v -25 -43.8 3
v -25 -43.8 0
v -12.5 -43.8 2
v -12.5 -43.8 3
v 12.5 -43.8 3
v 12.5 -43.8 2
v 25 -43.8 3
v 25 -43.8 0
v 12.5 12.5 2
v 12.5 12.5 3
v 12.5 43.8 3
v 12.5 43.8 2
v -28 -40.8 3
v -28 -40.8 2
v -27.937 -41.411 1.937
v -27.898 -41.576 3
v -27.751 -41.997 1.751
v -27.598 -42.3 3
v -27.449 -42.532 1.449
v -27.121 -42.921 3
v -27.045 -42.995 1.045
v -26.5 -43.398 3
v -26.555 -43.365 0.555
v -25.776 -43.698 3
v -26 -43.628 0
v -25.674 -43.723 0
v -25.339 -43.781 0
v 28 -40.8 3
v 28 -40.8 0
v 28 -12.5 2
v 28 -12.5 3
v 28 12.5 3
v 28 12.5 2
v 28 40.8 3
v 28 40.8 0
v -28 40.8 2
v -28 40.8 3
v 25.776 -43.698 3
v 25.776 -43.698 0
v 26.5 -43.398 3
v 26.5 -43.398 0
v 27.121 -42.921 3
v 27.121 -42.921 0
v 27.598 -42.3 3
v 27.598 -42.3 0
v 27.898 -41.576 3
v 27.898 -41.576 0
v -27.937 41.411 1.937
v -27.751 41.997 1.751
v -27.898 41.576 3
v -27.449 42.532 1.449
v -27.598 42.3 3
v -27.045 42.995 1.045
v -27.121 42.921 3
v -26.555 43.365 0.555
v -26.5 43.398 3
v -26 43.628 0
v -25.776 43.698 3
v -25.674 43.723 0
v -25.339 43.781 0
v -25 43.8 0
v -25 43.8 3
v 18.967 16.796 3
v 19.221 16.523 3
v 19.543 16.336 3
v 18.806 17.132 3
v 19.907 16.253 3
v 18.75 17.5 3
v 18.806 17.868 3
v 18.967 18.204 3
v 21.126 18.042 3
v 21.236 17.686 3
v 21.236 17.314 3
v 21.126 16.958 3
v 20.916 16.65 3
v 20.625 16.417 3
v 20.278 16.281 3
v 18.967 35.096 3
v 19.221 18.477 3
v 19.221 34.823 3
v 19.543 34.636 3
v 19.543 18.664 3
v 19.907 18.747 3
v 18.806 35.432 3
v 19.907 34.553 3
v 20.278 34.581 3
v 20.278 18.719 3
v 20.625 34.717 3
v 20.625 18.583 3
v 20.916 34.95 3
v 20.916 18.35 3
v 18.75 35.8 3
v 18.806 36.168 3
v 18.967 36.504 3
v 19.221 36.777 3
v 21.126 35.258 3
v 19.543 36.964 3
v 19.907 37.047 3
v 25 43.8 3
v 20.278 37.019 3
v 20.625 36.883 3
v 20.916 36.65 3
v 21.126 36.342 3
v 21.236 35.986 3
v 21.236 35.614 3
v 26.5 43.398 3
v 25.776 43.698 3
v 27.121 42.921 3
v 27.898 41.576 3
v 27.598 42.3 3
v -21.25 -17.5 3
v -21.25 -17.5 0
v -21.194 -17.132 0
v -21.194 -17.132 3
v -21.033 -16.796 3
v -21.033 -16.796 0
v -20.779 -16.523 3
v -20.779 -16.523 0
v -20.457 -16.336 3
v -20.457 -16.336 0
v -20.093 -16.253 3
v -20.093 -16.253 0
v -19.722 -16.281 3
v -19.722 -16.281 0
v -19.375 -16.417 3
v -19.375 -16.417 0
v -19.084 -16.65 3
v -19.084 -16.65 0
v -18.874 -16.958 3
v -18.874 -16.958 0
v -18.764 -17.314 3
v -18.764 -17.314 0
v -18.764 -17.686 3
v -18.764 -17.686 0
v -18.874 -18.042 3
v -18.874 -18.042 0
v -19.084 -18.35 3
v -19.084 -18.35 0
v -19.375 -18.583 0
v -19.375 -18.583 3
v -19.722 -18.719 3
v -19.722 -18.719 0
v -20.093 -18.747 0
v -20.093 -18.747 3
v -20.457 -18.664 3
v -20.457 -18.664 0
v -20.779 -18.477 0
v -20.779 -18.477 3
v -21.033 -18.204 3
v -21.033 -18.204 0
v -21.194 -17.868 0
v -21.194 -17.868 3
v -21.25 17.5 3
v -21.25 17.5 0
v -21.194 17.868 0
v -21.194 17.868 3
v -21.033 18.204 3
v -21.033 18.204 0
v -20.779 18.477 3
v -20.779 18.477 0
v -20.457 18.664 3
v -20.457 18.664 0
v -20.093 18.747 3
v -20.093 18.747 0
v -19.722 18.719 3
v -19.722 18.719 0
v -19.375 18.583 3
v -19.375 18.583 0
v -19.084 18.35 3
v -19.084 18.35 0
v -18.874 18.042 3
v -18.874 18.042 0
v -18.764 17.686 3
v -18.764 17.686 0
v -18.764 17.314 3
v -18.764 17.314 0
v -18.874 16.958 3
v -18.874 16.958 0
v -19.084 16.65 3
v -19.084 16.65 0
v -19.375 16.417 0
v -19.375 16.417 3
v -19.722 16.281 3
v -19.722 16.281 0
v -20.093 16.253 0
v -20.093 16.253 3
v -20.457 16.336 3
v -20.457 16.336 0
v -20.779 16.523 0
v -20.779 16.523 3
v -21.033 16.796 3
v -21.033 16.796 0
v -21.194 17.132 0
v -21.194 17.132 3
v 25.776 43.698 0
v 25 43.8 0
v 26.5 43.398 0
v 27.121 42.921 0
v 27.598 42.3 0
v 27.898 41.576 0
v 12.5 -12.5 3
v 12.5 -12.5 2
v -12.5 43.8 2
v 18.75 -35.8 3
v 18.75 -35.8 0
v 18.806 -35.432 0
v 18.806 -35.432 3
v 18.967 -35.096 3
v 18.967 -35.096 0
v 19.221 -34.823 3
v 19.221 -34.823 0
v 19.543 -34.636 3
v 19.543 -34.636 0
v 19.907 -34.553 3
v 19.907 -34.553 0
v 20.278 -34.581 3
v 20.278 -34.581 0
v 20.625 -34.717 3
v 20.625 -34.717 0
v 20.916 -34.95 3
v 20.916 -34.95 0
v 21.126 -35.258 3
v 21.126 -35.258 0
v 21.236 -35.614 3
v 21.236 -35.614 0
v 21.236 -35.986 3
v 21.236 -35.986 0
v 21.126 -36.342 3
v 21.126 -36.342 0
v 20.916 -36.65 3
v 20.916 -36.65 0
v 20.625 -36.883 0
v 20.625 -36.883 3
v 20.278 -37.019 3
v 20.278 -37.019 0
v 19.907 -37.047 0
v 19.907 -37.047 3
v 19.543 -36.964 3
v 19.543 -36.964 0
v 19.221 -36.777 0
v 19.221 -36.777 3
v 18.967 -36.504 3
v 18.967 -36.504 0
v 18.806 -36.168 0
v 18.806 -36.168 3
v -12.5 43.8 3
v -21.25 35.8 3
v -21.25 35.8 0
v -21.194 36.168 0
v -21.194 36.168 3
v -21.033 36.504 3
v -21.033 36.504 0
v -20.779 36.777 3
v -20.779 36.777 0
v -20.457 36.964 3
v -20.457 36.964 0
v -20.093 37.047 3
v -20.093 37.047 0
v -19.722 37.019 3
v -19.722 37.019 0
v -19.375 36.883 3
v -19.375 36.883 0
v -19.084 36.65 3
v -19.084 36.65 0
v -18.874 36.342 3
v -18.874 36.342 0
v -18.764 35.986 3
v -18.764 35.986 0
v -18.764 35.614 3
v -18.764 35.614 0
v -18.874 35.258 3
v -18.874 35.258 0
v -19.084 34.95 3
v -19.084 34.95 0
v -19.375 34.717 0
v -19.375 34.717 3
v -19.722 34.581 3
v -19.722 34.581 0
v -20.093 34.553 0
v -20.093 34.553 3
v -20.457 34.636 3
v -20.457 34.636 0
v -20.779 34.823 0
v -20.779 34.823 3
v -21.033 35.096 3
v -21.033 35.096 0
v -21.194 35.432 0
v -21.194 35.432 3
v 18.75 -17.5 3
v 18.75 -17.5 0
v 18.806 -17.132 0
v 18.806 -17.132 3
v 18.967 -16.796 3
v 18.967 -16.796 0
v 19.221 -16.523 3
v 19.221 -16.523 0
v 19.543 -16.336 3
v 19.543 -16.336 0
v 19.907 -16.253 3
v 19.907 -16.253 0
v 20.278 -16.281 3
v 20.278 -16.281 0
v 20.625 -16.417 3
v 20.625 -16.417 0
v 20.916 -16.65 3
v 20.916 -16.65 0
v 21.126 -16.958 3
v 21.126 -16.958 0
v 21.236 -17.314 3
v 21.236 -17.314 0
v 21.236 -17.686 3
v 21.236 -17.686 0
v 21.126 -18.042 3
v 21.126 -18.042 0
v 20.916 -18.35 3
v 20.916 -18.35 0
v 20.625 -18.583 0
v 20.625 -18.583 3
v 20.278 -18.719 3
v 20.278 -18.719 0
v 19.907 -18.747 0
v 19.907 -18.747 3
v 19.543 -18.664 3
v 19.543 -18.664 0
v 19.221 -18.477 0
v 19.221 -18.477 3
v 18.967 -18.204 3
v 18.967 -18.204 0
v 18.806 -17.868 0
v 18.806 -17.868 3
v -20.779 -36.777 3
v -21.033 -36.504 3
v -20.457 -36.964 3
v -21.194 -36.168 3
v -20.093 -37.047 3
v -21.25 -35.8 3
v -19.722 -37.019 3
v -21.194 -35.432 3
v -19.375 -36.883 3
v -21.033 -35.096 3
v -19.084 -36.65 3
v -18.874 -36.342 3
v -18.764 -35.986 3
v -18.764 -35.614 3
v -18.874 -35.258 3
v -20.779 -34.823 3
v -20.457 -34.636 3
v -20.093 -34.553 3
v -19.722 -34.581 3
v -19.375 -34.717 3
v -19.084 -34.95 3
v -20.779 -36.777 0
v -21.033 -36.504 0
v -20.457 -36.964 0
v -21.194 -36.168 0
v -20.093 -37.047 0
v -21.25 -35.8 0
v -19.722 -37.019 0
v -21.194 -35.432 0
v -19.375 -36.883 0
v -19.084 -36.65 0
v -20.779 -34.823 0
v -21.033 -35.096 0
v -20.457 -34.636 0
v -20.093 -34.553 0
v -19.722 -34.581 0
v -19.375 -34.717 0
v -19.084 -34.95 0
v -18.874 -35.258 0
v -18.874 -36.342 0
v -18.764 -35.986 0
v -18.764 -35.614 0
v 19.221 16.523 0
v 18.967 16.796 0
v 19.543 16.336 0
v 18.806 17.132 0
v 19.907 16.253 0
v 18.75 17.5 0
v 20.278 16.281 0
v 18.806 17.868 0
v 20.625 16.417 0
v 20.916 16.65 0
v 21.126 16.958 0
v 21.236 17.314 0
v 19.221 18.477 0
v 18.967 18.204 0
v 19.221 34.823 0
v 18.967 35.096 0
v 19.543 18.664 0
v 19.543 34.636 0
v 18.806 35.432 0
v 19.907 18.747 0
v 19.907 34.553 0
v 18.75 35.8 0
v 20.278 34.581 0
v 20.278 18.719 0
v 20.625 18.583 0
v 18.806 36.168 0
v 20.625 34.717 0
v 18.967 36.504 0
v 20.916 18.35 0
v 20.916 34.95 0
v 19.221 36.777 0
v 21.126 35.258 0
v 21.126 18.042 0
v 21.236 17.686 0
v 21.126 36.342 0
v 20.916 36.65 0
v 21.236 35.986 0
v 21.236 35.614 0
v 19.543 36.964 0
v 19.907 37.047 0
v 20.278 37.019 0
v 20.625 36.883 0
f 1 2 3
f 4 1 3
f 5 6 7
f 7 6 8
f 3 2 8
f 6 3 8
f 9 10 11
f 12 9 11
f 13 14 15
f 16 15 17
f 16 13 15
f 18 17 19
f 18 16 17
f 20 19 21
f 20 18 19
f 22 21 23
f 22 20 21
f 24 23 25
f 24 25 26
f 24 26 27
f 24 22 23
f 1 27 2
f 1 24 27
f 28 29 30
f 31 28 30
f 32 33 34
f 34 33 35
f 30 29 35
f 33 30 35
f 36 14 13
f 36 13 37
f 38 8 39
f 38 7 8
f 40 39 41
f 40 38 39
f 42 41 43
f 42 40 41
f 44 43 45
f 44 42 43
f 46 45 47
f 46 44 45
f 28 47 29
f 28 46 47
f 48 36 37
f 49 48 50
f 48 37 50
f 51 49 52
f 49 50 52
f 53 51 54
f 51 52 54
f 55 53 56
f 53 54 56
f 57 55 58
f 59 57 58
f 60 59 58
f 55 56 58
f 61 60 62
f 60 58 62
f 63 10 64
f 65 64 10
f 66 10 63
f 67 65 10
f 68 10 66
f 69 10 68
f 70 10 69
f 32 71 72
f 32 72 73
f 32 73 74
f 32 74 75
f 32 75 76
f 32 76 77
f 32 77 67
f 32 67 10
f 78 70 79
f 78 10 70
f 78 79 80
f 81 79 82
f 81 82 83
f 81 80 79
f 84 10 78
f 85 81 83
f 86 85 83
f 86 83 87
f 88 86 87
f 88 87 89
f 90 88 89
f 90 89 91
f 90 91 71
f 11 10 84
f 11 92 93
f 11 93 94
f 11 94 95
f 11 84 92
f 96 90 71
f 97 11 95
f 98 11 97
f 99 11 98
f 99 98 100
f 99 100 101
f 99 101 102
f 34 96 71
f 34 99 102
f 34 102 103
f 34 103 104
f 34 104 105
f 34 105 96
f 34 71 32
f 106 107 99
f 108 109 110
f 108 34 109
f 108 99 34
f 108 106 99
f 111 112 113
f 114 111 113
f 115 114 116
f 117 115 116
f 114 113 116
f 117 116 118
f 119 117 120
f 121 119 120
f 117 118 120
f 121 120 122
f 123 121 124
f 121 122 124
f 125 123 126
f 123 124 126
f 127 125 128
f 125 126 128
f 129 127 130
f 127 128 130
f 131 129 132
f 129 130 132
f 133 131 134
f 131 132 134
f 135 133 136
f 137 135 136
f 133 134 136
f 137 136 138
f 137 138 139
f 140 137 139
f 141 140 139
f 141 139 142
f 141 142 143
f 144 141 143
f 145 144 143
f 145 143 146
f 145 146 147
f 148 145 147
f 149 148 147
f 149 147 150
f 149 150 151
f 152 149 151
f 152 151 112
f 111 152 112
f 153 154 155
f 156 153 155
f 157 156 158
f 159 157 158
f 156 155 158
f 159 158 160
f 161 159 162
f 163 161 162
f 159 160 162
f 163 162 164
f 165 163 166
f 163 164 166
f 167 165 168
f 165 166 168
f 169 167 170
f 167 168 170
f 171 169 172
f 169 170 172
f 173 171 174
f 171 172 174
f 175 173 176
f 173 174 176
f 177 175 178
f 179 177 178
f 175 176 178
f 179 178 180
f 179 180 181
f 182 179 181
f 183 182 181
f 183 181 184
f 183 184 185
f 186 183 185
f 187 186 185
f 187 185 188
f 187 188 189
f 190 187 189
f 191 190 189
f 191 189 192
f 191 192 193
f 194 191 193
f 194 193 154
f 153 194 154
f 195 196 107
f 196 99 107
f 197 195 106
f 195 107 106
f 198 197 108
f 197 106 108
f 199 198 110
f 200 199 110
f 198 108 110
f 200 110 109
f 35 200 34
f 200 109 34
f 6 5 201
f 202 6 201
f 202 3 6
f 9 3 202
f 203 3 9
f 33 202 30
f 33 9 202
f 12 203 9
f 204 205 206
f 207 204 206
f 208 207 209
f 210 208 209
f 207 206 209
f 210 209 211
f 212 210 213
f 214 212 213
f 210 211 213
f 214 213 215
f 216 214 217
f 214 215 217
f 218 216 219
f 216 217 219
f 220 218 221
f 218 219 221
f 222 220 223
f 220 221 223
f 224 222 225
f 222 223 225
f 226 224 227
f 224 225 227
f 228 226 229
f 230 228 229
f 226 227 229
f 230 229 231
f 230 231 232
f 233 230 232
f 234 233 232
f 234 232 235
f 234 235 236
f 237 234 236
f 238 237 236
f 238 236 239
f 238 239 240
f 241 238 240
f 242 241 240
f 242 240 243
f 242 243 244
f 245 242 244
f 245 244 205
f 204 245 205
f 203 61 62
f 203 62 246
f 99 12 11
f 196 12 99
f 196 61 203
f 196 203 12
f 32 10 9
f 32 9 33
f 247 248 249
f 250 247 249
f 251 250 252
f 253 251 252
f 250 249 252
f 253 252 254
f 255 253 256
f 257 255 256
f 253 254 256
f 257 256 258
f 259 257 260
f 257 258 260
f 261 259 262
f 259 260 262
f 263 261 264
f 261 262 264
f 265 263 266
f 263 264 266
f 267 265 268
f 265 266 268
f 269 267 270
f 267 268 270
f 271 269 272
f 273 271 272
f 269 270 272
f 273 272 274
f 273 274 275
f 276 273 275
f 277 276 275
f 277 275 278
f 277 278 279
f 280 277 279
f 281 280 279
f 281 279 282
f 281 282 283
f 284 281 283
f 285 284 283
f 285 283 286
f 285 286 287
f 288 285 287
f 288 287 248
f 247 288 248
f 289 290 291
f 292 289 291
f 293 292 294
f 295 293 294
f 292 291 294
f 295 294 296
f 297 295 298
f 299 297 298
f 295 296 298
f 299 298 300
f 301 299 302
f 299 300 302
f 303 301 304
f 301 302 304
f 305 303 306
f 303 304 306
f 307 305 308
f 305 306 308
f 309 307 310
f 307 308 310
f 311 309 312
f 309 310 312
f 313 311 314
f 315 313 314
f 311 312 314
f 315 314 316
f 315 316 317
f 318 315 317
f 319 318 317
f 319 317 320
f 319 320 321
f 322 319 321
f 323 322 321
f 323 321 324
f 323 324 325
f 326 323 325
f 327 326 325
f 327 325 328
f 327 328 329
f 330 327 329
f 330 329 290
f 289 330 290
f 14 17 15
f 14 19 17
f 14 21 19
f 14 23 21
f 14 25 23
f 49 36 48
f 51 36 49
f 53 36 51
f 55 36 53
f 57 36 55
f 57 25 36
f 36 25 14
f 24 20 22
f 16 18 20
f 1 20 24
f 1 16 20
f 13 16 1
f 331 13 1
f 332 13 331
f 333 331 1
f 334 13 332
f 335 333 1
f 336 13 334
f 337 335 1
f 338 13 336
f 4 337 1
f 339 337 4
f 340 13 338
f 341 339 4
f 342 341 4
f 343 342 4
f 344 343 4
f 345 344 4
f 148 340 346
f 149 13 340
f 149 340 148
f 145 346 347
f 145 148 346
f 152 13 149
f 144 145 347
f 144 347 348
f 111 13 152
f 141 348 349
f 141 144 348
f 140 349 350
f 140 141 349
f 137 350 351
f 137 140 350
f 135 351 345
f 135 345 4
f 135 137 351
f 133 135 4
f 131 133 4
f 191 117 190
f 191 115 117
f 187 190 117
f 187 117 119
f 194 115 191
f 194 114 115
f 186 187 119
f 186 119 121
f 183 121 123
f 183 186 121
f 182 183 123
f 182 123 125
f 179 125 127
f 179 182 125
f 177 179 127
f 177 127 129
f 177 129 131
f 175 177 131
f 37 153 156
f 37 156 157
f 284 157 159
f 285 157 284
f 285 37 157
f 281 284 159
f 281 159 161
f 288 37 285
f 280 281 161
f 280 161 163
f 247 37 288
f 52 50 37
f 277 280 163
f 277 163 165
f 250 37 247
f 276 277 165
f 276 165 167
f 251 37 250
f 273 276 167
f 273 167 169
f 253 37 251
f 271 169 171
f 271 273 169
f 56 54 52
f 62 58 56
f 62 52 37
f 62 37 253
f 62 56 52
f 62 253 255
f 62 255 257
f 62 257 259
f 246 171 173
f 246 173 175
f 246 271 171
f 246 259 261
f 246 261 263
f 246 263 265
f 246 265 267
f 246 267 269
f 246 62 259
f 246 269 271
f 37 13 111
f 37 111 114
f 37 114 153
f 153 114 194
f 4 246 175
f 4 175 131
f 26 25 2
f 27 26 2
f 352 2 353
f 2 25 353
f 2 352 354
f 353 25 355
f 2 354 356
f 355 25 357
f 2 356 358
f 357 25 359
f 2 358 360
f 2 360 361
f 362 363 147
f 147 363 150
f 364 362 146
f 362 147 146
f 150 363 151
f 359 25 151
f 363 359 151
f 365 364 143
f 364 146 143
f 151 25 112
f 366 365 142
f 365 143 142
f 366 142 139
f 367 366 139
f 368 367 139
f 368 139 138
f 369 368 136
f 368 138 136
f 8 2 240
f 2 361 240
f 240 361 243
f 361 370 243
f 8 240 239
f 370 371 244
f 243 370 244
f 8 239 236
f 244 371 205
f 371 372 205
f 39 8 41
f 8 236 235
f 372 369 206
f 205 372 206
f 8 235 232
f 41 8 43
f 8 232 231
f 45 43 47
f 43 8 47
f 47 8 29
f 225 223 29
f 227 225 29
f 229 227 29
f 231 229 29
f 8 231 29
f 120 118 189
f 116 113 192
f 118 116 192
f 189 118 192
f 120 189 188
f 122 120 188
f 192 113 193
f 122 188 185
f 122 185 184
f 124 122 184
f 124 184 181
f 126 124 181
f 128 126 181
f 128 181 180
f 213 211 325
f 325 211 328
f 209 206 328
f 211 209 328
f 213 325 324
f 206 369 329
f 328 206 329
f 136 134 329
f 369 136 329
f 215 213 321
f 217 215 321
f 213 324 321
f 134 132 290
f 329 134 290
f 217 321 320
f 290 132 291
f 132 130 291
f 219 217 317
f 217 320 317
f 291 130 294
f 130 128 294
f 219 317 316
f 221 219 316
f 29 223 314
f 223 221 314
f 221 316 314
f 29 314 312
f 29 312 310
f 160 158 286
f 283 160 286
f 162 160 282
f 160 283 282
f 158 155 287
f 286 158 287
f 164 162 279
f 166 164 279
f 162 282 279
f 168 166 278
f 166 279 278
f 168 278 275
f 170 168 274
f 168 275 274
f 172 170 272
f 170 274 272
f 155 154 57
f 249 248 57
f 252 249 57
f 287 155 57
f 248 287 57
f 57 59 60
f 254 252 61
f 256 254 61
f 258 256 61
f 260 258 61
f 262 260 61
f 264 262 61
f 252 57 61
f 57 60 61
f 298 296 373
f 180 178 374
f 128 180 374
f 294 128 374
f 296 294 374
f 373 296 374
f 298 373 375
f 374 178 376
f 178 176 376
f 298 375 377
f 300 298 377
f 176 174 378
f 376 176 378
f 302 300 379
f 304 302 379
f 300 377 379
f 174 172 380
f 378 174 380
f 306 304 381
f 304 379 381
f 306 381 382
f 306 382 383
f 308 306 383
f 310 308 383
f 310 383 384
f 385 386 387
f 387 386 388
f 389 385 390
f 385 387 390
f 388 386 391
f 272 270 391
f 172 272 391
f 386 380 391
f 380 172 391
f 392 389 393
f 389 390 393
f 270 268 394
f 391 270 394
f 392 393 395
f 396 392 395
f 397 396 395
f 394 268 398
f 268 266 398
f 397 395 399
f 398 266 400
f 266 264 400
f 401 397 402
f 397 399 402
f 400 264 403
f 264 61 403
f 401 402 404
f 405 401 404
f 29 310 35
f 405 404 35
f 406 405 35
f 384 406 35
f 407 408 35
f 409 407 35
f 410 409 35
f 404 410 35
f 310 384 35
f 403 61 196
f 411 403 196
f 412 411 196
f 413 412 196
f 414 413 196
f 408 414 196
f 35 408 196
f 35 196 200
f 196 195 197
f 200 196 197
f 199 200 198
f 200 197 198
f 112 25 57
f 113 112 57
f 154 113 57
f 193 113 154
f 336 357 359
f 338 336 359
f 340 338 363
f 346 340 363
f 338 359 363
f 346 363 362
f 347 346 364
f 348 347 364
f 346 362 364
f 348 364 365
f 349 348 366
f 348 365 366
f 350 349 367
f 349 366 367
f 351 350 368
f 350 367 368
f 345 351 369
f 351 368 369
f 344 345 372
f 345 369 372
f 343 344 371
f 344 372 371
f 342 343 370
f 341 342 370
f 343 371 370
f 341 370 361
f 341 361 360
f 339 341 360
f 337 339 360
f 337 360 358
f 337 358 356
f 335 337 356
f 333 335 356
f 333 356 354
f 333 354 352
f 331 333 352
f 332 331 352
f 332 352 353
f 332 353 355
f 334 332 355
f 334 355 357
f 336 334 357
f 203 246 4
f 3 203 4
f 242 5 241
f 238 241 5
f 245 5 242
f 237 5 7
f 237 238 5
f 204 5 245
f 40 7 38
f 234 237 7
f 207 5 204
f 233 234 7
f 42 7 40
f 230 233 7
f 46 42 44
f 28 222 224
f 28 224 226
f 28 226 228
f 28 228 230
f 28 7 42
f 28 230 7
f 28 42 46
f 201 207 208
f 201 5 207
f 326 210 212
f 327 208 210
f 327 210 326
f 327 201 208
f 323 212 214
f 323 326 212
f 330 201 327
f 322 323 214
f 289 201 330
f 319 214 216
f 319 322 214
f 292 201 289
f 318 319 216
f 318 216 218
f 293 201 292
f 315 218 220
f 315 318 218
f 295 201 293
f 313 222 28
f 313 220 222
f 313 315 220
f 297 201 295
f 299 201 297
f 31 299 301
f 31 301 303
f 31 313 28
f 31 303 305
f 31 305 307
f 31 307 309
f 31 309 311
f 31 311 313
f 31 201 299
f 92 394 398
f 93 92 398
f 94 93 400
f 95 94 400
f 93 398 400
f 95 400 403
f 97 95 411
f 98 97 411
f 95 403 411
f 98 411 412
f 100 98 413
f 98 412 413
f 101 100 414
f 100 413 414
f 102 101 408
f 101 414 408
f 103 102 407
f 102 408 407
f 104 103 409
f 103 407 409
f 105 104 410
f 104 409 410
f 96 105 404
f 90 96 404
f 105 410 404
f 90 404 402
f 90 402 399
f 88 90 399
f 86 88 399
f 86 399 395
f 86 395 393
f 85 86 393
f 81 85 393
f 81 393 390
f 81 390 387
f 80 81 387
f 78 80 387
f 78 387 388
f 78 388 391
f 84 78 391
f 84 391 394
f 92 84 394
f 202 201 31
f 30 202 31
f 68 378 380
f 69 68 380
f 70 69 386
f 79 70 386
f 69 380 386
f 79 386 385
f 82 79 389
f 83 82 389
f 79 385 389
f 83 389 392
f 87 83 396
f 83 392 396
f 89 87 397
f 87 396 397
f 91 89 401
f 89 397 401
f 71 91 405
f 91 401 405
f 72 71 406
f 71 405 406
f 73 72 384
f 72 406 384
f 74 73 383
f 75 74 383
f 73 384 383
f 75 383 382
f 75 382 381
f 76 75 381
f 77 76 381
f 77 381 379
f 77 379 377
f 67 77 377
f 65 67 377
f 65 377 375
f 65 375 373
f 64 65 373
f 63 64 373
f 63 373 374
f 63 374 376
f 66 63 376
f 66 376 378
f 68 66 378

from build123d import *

# Parameters (mm, degrees)
F0_W     = 56
F0_H     = 87.6
F1_DEPTH = 3
F2_SIZE  = 2
F3_W     = 15.5
F3_H     = 25
F4_DEPTH = 1
F5_R     = 3
F8_D     = 2.5
F8_DEPTH = 68
F8_TIP   = 0.7510757738


with BuildPart() as f1:
    # F0 (on Top) → F1 (new body)
    with BuildSketch(Plane.XY):
        Rectangle(F0_W, F0_H)
    extrude(amount=F1_DEPTH)

    # F2
    f2_edges = [f1.edges().sort_by_distance(p)[0] for p in [
        (-28, 0, 0),
    ]]
    chamfer(f2_edges, length=F2_SIZE)

    # F3 (on face) → F4 (cut)
    with BuildSketch(Plane.XY.offset(3)):
        Polygon((12.5, 43.8), (-12.5, 43.8), (-12.5, -43.8), (12.5, -43.8), (12.5, -12.5), (12.5, 12.5), align=None)
        with Locations((20.25, 0)):
            Rectangle(F3_W, F3_H)
    extrude(amount=-F4_DEPTH, mode=Mode.SUBTRACT)

    # F5
    f5_edges = [f1.edges().sort_by_distance(p)[0] for p in [
        (-28, 43.8, 2.5),
        (-28, -43.8, 2.5),
        (28, -43.8, 1.5),
        (28, 43.8, 1.5),
    ]]
    fillet(f5_edges, radius=F5_R)

    # F8
    with Locations(Plane.XY.offset(3)):
        with Locations((-20, 35.8), (20, 35.8), (20, 17.5), (20, -17.5), (20, -35.8), (-20, -35.8), (-20, 17.5), (-20, -17.5)):
            Hole(F8_D / 2, depth=F8_DEPTH)
            with Locations((0, 0, -(F8_DEPTH + F8_TIP / 2))):  # 118° drill point
                Cone(0, F8_D / 2, F8_TIP, mode=Mode.SUBTRACT)


solid = f1.part
